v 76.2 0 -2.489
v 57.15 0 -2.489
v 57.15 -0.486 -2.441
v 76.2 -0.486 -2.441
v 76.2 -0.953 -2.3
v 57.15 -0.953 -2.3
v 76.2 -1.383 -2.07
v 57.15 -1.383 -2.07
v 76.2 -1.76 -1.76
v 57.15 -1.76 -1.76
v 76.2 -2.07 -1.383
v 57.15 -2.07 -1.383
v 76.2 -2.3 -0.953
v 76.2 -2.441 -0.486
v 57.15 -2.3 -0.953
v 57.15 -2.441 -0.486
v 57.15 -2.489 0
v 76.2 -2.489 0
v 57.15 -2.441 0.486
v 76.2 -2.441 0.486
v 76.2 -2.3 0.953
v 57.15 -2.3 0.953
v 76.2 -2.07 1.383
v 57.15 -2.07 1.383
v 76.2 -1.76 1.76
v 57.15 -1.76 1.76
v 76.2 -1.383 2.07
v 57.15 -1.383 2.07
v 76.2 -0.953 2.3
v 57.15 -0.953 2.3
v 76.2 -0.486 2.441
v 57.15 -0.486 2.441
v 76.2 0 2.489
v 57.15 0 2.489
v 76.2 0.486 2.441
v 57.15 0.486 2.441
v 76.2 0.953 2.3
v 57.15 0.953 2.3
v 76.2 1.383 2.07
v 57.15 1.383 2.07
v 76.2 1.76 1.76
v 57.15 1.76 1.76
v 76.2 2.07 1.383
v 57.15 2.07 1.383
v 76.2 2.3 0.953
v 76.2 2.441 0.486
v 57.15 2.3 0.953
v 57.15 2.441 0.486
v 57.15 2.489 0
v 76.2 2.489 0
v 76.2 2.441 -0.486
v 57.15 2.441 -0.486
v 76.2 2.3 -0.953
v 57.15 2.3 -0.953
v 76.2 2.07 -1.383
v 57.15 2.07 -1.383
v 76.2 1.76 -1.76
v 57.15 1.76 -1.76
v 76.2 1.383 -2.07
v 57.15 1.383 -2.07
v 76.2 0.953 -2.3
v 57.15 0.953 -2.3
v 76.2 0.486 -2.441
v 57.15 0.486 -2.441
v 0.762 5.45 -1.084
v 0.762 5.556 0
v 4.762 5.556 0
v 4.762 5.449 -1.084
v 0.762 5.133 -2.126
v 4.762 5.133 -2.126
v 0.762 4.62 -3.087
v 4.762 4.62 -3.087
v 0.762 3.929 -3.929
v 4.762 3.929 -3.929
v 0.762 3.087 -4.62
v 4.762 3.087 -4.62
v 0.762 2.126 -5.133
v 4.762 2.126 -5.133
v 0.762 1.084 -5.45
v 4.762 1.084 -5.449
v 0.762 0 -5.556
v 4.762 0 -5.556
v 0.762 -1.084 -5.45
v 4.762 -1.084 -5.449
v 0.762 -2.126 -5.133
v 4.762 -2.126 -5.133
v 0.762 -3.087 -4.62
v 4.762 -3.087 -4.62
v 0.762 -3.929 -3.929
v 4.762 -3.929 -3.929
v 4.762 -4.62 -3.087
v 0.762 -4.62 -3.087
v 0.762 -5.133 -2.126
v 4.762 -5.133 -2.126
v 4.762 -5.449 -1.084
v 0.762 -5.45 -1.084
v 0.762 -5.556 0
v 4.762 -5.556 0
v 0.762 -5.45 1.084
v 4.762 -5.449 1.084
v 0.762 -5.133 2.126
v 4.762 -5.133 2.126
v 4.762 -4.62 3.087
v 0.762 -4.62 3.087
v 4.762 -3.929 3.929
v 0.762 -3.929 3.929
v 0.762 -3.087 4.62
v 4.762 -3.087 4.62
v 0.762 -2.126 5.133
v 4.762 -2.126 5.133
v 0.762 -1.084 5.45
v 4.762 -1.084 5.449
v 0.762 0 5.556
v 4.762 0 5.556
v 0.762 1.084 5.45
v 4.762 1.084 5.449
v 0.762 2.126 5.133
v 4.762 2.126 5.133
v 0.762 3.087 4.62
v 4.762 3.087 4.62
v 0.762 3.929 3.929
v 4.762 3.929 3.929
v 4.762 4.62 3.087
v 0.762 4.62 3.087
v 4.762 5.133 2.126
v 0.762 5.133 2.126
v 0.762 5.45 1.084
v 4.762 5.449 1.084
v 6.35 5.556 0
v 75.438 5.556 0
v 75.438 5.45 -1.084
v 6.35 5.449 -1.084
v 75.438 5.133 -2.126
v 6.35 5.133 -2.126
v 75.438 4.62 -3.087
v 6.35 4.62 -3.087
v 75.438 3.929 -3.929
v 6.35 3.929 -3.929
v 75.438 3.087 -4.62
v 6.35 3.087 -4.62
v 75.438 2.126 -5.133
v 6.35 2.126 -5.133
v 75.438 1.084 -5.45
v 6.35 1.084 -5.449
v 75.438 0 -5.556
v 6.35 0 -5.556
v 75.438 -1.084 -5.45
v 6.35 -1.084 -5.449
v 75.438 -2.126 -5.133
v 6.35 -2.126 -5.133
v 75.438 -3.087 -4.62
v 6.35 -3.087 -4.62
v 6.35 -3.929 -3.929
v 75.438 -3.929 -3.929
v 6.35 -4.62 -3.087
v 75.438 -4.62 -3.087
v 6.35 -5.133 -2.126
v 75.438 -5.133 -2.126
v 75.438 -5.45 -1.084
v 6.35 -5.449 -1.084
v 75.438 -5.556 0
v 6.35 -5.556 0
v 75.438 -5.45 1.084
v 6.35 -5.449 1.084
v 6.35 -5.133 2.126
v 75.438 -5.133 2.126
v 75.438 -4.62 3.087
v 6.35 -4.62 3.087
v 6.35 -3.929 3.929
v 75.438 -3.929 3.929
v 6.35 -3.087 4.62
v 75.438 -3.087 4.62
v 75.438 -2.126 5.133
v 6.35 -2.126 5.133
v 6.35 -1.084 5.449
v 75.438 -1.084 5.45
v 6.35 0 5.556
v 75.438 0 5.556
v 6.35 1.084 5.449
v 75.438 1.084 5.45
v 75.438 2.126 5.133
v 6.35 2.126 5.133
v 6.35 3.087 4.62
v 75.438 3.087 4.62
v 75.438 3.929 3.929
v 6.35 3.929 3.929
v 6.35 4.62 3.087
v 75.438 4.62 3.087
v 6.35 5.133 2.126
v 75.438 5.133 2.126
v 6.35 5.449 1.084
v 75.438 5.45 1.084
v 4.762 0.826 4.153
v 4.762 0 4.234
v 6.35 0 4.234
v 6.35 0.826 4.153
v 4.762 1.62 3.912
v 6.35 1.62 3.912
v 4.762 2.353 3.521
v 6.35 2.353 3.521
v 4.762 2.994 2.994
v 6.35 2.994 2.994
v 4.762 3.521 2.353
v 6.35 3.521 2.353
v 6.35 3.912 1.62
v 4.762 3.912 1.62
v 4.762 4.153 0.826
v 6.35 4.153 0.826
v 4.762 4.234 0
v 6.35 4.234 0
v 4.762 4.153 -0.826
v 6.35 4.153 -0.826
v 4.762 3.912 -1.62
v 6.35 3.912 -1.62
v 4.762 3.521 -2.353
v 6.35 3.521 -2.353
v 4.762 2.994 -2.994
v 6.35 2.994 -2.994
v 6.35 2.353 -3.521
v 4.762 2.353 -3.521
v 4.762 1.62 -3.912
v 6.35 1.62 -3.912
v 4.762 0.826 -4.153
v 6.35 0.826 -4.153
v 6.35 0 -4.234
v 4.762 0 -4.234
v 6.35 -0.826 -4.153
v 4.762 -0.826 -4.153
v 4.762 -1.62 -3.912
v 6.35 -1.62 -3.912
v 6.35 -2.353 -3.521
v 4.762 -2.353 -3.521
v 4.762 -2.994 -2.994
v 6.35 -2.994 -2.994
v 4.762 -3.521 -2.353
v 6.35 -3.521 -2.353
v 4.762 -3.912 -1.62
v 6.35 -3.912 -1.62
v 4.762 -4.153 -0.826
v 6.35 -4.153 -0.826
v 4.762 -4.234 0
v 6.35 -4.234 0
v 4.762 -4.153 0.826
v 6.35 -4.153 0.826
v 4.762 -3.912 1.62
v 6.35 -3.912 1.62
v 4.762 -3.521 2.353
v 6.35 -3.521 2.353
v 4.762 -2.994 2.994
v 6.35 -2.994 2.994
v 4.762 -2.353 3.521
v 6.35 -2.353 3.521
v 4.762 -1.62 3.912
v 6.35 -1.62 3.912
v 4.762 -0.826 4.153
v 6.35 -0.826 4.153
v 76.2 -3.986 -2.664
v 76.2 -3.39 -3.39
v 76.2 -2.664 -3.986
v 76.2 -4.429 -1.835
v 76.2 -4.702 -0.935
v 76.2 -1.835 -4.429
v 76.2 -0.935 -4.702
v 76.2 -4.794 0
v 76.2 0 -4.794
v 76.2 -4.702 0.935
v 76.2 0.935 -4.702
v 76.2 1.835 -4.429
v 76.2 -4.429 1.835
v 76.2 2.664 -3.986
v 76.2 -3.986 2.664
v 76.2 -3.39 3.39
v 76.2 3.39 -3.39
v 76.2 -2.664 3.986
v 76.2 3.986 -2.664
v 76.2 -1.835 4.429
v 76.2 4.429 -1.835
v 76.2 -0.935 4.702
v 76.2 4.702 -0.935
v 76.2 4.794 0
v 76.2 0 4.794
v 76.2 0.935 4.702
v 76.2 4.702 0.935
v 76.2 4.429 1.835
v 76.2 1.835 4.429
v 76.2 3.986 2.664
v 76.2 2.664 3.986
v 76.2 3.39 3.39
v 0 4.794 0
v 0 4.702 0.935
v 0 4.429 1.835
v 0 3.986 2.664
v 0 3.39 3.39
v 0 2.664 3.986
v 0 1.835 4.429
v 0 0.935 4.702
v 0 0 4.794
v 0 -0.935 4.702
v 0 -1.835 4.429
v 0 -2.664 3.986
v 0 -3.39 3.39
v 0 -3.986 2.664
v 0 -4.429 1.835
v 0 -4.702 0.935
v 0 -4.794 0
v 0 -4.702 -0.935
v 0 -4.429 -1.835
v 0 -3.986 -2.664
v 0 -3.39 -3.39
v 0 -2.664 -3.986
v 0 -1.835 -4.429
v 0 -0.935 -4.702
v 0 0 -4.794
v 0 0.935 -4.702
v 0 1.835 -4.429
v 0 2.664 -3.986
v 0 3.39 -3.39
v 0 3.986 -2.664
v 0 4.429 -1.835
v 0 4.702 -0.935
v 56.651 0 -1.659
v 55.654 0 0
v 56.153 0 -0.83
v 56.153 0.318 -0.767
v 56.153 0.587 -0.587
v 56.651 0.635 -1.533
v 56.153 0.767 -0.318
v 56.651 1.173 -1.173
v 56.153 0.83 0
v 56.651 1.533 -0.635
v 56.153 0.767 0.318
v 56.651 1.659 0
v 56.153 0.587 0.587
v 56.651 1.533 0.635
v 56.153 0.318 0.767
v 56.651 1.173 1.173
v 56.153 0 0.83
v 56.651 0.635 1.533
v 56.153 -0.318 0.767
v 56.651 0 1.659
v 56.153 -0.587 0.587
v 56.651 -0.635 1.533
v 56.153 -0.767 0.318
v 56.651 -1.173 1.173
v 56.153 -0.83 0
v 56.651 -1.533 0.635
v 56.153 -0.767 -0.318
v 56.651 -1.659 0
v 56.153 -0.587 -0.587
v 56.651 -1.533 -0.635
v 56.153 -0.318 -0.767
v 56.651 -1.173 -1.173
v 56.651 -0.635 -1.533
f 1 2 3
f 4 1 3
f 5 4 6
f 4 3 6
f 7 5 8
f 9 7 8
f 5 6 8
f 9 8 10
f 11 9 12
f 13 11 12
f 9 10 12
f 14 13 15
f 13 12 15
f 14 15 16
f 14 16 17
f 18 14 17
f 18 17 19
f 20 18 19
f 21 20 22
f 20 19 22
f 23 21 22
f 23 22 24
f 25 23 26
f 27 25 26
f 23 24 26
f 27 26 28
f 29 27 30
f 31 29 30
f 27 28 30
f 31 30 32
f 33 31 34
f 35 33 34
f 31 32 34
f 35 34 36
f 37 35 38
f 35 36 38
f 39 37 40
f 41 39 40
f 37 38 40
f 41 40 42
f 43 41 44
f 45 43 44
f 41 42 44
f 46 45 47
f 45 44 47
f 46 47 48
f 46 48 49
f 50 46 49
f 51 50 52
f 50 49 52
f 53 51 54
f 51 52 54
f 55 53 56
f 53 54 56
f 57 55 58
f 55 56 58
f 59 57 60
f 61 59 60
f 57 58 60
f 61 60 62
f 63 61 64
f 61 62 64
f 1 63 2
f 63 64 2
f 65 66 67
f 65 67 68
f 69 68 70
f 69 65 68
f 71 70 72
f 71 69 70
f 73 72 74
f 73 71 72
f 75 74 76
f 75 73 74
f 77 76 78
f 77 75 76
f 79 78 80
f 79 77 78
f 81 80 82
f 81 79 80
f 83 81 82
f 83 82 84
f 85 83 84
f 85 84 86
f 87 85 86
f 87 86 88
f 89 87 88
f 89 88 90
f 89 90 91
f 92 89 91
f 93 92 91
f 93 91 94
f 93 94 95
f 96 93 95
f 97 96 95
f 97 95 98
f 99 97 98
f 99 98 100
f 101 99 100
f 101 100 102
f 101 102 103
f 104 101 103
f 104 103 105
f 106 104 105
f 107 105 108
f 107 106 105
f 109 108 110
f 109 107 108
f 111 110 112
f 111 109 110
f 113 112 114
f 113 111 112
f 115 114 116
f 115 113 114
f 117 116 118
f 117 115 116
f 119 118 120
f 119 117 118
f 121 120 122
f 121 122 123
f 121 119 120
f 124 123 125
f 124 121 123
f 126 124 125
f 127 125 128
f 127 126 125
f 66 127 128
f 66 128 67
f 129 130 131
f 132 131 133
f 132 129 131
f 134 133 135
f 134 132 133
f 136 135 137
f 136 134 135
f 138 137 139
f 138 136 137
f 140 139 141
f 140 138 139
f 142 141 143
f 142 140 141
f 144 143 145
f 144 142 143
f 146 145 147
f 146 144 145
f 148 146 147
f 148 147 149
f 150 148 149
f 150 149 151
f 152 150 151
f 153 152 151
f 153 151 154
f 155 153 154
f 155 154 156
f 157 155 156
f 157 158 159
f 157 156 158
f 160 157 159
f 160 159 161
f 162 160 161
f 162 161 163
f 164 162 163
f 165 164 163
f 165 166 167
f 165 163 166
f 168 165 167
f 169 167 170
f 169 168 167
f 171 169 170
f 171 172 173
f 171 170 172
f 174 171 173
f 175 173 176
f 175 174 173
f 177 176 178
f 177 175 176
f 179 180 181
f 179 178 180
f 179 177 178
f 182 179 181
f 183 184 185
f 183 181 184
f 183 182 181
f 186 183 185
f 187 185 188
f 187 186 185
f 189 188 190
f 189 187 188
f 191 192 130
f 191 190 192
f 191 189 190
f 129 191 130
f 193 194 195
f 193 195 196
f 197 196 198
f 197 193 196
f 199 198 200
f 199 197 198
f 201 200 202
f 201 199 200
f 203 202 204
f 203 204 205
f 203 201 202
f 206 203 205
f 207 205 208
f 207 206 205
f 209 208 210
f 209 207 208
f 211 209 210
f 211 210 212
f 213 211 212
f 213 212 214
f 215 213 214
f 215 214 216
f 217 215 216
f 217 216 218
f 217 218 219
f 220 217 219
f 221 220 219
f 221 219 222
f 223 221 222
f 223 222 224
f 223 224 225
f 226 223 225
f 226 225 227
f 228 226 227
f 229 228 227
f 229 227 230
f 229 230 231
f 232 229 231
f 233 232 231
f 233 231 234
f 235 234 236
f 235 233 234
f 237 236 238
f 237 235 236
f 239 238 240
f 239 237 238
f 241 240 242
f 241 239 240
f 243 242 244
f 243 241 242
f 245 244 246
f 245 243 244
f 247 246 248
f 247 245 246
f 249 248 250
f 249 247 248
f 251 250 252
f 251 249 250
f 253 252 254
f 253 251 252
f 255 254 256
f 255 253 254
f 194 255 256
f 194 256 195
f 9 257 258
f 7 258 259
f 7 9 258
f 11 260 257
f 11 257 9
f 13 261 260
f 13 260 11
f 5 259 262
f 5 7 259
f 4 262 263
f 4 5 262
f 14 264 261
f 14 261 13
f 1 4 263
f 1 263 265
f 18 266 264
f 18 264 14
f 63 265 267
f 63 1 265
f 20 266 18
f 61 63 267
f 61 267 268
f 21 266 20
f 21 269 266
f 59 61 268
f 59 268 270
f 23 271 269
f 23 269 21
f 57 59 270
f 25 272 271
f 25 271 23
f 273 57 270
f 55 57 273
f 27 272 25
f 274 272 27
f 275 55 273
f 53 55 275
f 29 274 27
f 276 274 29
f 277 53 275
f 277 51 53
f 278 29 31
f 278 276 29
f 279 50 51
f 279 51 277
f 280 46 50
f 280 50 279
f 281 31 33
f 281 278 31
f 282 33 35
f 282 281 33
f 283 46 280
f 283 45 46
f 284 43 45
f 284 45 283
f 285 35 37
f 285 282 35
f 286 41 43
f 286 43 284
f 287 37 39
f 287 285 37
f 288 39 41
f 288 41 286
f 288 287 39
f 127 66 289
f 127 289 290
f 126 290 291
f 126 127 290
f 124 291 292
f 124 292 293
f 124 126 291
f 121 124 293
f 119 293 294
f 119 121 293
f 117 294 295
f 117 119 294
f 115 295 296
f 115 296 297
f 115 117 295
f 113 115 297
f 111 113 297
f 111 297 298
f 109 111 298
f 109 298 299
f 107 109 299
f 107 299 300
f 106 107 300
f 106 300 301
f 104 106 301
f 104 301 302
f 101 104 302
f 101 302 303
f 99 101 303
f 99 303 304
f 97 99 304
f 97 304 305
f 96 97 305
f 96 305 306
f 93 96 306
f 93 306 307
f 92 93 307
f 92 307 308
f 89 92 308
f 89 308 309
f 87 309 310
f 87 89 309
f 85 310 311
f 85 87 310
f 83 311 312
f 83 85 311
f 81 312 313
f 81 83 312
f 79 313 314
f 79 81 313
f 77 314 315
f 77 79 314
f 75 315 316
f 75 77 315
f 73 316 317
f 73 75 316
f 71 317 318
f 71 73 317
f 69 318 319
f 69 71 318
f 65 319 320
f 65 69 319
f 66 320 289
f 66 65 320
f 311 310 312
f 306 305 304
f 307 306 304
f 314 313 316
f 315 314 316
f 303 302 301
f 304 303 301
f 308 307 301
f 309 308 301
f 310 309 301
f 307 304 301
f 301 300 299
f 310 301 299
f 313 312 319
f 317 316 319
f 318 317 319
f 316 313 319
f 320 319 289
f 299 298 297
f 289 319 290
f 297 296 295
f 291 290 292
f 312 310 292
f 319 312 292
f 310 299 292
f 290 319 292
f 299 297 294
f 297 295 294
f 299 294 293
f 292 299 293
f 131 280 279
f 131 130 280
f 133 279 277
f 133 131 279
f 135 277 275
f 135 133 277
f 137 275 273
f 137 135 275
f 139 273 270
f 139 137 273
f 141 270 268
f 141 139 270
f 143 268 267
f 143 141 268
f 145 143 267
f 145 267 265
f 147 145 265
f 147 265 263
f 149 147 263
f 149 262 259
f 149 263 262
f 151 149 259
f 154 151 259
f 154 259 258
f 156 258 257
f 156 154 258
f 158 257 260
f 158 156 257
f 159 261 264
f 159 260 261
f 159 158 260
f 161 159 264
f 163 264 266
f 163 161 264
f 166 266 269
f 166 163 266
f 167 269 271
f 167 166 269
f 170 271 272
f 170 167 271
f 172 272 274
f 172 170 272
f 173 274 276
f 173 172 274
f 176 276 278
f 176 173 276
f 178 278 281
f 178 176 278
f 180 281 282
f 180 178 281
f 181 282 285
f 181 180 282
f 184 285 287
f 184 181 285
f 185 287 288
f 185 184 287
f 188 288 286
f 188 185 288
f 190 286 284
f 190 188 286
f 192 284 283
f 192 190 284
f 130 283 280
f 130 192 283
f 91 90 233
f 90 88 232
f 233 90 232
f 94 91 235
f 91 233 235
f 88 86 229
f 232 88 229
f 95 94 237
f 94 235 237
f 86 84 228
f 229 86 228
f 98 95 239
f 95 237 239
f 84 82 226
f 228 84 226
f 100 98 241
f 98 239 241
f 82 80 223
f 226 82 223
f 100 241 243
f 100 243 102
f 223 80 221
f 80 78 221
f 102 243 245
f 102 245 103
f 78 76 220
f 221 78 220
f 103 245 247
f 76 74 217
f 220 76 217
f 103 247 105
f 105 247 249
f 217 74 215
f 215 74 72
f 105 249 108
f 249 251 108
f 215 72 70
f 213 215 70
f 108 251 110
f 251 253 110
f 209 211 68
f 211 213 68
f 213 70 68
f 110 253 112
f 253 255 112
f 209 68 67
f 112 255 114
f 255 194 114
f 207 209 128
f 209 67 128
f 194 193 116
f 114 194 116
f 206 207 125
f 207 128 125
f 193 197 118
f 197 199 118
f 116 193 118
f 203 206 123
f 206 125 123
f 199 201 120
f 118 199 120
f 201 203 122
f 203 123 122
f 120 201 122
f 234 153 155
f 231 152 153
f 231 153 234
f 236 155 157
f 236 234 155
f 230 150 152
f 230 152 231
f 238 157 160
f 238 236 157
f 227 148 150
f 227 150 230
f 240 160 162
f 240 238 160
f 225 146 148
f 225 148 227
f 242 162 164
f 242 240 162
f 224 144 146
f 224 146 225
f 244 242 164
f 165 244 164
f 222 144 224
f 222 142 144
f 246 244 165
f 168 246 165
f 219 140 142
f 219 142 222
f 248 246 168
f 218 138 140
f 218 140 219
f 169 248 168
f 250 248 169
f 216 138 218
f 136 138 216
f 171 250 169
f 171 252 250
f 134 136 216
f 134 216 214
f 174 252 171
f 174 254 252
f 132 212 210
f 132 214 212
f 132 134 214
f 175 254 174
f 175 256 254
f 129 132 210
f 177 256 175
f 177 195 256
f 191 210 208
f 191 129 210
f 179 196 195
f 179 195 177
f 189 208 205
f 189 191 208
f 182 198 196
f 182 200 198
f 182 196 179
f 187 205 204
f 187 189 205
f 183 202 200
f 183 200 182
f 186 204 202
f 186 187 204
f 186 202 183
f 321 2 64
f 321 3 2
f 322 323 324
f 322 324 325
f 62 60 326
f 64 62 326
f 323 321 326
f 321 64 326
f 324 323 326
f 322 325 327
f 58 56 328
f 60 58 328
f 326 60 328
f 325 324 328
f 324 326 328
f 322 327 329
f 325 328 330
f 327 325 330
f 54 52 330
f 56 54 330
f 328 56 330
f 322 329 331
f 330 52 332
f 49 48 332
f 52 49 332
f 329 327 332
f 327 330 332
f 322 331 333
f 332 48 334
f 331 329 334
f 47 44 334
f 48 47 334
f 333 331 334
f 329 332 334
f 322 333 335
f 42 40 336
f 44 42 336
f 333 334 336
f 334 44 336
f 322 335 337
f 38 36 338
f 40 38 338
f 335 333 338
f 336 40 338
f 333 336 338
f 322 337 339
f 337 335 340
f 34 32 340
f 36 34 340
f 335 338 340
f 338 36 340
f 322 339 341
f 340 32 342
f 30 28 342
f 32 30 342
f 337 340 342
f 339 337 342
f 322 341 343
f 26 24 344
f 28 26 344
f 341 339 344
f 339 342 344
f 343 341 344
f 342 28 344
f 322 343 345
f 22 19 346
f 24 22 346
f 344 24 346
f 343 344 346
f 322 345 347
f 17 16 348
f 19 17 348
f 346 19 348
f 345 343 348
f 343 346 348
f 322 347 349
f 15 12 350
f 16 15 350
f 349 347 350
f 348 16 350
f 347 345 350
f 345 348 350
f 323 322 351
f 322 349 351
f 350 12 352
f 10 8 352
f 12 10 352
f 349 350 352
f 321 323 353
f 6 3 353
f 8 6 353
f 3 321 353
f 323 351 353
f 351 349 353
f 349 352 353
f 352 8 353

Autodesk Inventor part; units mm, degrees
ref_plane "YZ Plane" through (0, 0, 0) normal (1, 0, 0) x (0, 1, 0)
ref_plane "XZ Plane" through (0, 0, 0) normal (0, 1, 0) x (-1, 0, 0)
ref_plane "XY Plane" through (0, 0, 0) normal (0, 0, 1) x (1, 0, 0)
sketch "Sketch1" plane through (0, 0, 0) normal (1, 0, 0) x (0, 1, 0)
  circle A0 centre (0, 0) radius 5.5563
  dimension "d0" = 11.1125
extrude "Extrusion1" add sketch "Sketch1" along normal blind 76.2
chamfer "Chamfer1" distance 0.762 angle 45 2 edges at (76.2, -5.5563, 0) (0, -5.5563, 0)
sketch "Sketch2" plane through (76.2, 0, 0) normal (1, 0, 0) x (0, 0, -1)
  point P0 (0, 0)
sketch "Sketch3" plane through (76.2, 0, 0) normal (1, 0, 0) x (0, 0, -1)
  point P0 (0, 0)
  point P1 (0, 0)
hole "Hole1" at (76.2, 0, 0) direction (-1, 0, 0) diameter 4.9784 depth 19.05 tip angle 118 thread size "1/4-20 UNC" class "2B" standard "ANSI Unified Screw Threads"
sketch "Sketch4" plane through (0, 0, 0) normal (-1, 0, 0) x (0, 0, 1)
  point P0 (0, 0)
ref_plane "Work Plane2" through (4.7625, 0, 0) normal (-1, 0, 0) x (0, 0, 1)
sketch "Sketch5" plane through (4.7625, 0, 0) normal (-1, 0, 0) x (0, 0, 1)
  circle A0 centre (0, 0) radius 5.5562
  circle A1 centre (0, 0) radius 4.2344
extrude "Extrusion2" cut sketch "Sketch5" against normal blind 1.5875
properties part number "upper die center pin"
